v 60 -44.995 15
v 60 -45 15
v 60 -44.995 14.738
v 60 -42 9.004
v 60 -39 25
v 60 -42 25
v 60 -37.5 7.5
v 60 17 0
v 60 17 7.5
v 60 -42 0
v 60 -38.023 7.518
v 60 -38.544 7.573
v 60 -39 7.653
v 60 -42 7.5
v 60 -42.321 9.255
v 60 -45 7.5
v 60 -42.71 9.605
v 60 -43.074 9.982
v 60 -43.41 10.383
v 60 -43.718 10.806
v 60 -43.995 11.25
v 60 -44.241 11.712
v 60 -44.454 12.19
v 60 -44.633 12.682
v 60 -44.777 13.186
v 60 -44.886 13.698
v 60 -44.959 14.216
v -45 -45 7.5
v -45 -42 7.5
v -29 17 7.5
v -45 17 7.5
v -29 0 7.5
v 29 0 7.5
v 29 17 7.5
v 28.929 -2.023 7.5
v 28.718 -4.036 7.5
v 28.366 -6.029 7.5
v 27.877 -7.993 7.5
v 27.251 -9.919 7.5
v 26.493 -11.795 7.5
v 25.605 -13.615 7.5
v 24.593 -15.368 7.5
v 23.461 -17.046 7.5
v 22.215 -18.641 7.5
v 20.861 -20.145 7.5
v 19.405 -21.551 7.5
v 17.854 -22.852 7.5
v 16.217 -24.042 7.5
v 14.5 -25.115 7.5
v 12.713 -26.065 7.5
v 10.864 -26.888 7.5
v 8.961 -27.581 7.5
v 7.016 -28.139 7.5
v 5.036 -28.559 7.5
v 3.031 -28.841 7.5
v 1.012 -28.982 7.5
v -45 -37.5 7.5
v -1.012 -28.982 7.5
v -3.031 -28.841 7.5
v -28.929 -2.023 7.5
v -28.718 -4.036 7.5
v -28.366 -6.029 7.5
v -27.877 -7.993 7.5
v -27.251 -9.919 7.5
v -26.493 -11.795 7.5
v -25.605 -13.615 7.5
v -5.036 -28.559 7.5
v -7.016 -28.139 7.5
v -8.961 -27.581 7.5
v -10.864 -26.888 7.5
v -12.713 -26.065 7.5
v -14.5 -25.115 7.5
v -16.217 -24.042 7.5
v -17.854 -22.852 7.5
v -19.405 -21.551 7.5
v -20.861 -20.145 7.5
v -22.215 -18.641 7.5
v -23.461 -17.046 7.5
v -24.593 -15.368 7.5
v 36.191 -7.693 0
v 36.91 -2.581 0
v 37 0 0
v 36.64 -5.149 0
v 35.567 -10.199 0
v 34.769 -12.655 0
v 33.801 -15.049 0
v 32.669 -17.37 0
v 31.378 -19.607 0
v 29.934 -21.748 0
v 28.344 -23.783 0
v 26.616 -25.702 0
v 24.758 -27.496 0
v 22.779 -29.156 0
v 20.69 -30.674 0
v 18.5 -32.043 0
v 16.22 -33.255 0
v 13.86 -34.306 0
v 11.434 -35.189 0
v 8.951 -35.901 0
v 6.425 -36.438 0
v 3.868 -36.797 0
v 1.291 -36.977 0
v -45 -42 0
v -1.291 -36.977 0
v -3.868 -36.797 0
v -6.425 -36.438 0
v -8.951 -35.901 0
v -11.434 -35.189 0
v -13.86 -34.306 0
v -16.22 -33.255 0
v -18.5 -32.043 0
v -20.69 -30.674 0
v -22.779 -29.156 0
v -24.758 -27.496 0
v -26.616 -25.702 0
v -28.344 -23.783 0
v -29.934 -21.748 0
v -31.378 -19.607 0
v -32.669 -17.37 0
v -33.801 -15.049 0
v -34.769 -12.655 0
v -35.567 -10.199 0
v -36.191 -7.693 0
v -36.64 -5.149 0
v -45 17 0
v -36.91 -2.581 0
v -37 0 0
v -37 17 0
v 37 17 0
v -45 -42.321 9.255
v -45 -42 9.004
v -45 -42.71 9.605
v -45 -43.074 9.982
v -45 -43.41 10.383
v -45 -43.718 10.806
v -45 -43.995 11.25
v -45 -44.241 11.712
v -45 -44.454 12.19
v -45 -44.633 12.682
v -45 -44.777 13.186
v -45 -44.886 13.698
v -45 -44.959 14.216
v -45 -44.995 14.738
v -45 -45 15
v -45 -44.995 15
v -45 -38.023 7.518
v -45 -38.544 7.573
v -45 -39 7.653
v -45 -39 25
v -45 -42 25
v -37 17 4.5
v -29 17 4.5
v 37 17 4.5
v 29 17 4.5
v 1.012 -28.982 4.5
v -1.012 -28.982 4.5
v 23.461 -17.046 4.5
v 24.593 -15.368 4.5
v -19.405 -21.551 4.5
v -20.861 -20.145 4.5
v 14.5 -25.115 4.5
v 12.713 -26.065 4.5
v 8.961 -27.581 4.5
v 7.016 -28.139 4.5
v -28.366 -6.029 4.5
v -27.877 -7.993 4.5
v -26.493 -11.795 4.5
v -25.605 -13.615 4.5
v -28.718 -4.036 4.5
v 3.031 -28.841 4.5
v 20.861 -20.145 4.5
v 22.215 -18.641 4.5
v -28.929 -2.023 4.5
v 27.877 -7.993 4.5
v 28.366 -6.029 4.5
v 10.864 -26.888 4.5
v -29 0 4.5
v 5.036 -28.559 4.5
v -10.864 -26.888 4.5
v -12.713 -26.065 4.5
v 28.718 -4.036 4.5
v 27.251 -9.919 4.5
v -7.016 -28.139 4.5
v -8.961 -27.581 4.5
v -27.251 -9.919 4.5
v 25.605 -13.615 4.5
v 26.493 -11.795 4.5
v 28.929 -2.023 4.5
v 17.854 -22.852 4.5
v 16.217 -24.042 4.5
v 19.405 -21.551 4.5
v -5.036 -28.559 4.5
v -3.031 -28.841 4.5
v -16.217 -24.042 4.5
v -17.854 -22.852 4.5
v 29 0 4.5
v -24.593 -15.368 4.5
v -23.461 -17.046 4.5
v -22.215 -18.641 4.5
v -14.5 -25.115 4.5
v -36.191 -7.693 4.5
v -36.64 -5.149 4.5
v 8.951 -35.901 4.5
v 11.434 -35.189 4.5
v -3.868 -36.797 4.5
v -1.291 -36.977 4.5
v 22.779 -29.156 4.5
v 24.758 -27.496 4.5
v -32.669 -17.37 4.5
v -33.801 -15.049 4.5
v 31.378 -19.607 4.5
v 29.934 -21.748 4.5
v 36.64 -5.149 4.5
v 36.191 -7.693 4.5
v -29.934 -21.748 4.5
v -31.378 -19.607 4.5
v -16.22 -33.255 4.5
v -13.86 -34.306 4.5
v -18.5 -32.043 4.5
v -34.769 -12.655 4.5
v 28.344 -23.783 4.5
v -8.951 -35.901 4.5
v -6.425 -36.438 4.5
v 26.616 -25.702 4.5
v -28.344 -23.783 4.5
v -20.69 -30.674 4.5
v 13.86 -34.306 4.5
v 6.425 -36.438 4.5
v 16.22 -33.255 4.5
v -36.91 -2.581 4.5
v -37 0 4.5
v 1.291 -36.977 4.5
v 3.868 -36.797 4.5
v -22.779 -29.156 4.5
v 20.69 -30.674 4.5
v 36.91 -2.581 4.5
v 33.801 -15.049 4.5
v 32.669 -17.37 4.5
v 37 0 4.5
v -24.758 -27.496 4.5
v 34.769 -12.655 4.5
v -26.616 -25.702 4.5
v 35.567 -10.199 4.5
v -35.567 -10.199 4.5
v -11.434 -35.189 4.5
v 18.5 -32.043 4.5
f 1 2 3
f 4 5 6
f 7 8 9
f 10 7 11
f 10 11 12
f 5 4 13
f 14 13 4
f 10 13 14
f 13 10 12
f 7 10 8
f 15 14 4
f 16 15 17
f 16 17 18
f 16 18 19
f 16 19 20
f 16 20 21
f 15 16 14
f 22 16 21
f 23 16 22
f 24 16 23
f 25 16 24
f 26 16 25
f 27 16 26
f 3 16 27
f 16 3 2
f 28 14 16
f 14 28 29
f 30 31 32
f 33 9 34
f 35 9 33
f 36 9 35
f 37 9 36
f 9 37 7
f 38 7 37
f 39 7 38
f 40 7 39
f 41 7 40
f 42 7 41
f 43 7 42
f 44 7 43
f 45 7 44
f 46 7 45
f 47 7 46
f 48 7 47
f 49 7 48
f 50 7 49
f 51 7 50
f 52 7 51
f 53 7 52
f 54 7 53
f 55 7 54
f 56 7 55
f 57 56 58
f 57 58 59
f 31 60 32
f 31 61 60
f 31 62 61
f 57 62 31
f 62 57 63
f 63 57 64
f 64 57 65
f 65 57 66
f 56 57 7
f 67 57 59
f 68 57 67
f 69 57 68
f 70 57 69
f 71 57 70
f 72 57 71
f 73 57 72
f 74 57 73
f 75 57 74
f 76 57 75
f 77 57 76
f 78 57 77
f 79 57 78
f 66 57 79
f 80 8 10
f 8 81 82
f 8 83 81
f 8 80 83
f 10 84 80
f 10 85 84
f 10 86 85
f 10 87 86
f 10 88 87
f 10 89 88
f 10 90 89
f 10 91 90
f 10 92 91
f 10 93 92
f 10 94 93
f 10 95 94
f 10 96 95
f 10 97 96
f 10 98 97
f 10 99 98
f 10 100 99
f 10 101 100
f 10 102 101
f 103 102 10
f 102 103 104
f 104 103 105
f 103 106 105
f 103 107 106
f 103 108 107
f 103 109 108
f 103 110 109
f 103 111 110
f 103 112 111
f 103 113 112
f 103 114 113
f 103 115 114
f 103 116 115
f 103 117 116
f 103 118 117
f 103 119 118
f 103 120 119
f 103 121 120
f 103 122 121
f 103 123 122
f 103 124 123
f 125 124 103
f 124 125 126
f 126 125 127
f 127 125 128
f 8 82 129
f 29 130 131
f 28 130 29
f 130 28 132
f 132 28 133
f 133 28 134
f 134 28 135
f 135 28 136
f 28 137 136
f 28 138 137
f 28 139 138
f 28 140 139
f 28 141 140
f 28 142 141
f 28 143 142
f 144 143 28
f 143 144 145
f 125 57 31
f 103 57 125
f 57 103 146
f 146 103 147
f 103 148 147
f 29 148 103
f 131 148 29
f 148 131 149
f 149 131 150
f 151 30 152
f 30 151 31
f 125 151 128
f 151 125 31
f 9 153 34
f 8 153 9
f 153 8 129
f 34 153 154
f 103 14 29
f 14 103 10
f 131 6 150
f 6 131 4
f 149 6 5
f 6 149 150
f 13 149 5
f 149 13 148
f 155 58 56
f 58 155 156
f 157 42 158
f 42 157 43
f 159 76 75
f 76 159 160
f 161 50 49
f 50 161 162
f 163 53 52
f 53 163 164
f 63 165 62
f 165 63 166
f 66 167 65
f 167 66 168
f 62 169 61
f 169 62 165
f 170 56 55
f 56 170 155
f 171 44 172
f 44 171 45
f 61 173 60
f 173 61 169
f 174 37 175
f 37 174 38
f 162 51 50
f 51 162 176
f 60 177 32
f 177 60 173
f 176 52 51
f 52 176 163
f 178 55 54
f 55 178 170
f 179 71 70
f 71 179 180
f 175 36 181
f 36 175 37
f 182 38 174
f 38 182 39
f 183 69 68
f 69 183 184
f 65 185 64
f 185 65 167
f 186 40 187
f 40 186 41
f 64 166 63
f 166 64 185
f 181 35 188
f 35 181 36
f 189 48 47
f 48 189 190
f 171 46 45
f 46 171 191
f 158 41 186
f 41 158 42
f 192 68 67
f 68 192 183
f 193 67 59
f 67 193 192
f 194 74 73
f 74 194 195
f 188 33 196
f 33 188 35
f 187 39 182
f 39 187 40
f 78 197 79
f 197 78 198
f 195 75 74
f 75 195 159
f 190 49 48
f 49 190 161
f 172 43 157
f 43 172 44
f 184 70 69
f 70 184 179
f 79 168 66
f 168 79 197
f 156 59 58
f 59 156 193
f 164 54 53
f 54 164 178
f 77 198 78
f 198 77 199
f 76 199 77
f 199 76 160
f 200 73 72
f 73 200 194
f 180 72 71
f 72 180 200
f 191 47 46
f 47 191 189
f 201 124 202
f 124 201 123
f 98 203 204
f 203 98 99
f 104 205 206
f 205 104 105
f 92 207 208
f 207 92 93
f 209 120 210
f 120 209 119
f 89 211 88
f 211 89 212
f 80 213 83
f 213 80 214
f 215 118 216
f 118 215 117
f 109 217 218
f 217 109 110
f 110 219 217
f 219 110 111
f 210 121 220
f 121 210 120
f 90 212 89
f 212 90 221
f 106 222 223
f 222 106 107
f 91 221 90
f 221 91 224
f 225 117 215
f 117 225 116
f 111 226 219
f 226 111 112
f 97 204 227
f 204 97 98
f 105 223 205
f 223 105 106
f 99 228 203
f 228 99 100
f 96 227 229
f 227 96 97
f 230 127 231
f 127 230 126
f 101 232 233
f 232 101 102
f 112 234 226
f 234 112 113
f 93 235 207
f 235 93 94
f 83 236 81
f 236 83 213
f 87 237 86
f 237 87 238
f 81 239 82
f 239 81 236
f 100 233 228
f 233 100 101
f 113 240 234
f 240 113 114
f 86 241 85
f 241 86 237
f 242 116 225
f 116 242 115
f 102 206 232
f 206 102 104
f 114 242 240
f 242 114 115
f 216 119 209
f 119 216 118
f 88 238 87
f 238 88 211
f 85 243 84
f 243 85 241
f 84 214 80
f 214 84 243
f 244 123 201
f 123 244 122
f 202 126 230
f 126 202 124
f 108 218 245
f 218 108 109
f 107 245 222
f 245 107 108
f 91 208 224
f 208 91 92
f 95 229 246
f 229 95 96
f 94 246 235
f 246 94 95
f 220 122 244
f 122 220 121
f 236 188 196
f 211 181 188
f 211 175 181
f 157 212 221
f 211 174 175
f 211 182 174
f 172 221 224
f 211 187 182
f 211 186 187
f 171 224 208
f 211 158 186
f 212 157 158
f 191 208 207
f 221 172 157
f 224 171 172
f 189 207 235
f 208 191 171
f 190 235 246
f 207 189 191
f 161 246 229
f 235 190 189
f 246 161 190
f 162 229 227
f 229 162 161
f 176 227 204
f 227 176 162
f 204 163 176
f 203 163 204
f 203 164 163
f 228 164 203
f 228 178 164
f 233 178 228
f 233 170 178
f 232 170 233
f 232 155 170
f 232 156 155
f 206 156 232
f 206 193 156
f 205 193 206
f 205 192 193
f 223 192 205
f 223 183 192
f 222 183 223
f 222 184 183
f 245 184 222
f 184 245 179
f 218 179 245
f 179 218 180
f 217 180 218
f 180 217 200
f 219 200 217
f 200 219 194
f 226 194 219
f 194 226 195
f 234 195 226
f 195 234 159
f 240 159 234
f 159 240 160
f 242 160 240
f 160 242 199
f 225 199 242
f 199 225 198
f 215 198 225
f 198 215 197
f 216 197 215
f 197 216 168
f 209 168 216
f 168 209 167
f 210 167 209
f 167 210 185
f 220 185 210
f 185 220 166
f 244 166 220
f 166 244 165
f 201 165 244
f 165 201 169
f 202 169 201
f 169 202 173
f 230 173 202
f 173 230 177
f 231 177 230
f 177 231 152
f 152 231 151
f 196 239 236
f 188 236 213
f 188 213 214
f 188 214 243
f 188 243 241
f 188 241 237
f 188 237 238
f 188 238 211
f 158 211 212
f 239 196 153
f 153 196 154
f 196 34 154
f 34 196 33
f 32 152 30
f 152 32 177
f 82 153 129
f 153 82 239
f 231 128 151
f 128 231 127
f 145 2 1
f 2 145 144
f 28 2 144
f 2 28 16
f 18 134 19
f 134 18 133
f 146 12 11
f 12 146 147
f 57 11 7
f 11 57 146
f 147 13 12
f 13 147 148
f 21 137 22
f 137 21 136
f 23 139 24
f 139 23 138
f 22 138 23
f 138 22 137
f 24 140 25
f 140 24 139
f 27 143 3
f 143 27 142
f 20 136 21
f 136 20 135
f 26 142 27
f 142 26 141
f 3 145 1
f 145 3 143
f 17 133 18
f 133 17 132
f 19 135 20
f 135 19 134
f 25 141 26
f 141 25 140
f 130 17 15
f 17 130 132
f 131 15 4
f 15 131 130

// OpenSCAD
//aeropress stand
$fn = 90; //resolution of curves


plunger_tube_diameter = 58; //measured 56.5mm
plunger_lip_diameter = 74; //measured 70.9mm
plunger_lip_height = 4.5; //measured 3.6mm
plunger_nominal_height = 100; //not measured, just tall enough to subtract from everything


//c-clamp, or full wrap around that bench lip?

//back is part to c-clamp to
back_height = 25;
back_depth = 3;
back_additional_side = 15;

finger_width = 8;
finger_back_width = 5;
finger_height = 3;
front_overhang = -20;

//
//make holder
//
difference(){
//    hull(){ //hull-wedge, or union/right angle? make put a rotated cylinder subtraction?
    union(){
        //make holder around plunger
        translate([-plunger_lip_diameter/2-finger_width,-plunger_lip_diameter/2-finger_back_width,0]){
            cube([plunger_lip_diameter+finger_width*2+back_additional_side,plunger_lip_diameter+front_overhang+finger_back_width,plunger_lip_height+finger_height]);
        }
        
        //make back wall against bench lip
        translate([-plunger_lip_diameter/2-finger_width,-plunger_lip_diameter/2-finger_back_width,0]){
            cube([plunger_lip_diameter+finger_width*2+back_additional_side,back_depth,back_height]);
        }

    } //end union


    //make plunger model to subtract from things
    cylinder(plunger_nominal_height, plunger_tube_diameter/2, plunger_tube_diameter/2);
    cylinder(plunger_lip_height, plunger_lip_diameter/2, plunger_lip_diameter/2);
    //then square off the tubes so we have the path of object going into the holder
    translate([-plunger_tube_diameter/2,0,0]){
        cube([plunger_tube_diameter,plunger_tube_diameter,plunger_nominal_height]);
    }
    translate([-plunger_lip_diameter/2,0,0]){
        cube([plunger_lip_diameter,plunger_lip_diameter,plunger_lip_height]);
    }

} //end difference

bevel_diameter = 15;
//TODO this is fucked.
translate([plunger_lip_diameter/2+finger_width+back_additional_side,-plunger_lip_diameter/2-0.5,bevel_diameter/2+plunger_lip_height+finger_height]){
    rotate([180,0,0]){
        rotate([0,-90,0]){
            difference(){
                cube([bevel_diameter/2,bevel_diameter/2,plunger_lip_diameter+finger_width*2+back_additional_side]);
                cylinder(plunger_lip_diameter+finger_width*2+back_additional_side,bevel_diameter/2,bevel_diameter/2);
            }
        }
    }
}
